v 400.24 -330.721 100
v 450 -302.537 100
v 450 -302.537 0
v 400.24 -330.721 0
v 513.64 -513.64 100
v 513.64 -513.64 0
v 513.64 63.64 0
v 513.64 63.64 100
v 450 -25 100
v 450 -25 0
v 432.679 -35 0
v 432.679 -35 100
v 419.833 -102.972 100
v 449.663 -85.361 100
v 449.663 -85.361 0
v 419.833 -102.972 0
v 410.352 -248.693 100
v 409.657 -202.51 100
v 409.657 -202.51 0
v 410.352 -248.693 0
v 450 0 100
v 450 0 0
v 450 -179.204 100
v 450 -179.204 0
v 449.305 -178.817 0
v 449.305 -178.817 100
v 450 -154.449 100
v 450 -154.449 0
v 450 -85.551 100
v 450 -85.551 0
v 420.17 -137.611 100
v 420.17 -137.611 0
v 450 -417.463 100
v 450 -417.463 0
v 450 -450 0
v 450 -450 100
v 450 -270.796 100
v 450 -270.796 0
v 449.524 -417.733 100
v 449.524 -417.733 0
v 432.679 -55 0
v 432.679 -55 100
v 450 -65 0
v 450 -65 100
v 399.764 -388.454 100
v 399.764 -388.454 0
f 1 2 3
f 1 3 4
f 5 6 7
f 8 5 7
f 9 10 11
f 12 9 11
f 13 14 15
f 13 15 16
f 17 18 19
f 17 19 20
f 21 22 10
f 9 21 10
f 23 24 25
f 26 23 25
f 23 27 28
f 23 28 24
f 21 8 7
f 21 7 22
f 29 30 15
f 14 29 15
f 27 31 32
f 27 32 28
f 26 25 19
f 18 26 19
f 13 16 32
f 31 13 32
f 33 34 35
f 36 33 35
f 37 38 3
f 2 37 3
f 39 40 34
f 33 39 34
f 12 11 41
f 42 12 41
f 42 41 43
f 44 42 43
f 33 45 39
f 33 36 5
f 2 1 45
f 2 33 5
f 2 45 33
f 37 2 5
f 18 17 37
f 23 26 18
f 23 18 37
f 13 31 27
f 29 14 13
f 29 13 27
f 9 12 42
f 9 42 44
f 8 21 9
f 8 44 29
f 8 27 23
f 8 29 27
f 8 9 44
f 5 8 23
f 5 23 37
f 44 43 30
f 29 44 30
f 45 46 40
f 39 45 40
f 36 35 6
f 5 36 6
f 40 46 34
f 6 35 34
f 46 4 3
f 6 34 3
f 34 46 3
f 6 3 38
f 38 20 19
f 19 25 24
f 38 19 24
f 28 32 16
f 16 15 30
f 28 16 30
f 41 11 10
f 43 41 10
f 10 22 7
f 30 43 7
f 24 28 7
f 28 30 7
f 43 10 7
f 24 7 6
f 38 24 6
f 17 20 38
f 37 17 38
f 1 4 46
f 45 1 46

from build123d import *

# Parameters (mm, degrees)
F1_DEPTH = 100


with BuildPart() as f1:
    # F0 (on Top) → F1 (new body)
    with BuildSketch(Plane.XY):
        Polygon((513.63961, 63.63961), (450, 0), (450, -25), (467.320508, -35), (467.320508, -55), (450, -65), (450, -85.550674), (479.830233, -102.38872), (480.166933, -137.0281), (450.336699, -154.63938), (450, -154.449326), (450, -179.204377), (489.648216, -201.307126), (490.342739, -247.489925), (450.694523, -271.1828), (450, -270.795623), (450, -302.53674), (450.476343, -302.266938), (500.23647, -331.545994), (499.760127, -389.279056), (450, -417.46326), (450, -450), (513.63961, -513.63961), align=None)
        Polygon((467.320508, -35), (450, -25), (450, -65), (467.320508, -55), align=None)
        Polygon((450, -65), (450, -25), (432.679492, -35), (432.679492, -55), align=None)
        Polygon((450, -154.449326), (450, -85.550674), (449.663301, -85.36062), (419.833067, -102.9719), (420.169767, -137.61128), align=None)
        Polygon((479.830233, -102.38872), (450, -85.550674), (450, -154.449326), (450.336699, -154.63938), (480.166933, -137.0281), align=None)
        Polygon((489.648216, -201.307126), (450, -179.204377), (450, -270.795623), (450.694523, -271.1828), (490.342739, -247.489925), align=None)
        Polygon((450, -270.795623), (450, -179.204377), (449.305477, -178.8172), (409.657261, -202.510075), (410.351784, -248.692874), align=None)
        Polygon((449.523657, -417.733062), (450, -417.46326), (450, -302.53674), (400.239873, -330.720944), (399.76353, -388.454006), align=None)
        Polygon((450, -302.53674), (450, -417.46326), (499.760127, -389.279056), (500.23647, -331.545994), (450.476343, -302.266938), align=None)
    extrude(amount=F1_DEPTH)


solid = f1.part
